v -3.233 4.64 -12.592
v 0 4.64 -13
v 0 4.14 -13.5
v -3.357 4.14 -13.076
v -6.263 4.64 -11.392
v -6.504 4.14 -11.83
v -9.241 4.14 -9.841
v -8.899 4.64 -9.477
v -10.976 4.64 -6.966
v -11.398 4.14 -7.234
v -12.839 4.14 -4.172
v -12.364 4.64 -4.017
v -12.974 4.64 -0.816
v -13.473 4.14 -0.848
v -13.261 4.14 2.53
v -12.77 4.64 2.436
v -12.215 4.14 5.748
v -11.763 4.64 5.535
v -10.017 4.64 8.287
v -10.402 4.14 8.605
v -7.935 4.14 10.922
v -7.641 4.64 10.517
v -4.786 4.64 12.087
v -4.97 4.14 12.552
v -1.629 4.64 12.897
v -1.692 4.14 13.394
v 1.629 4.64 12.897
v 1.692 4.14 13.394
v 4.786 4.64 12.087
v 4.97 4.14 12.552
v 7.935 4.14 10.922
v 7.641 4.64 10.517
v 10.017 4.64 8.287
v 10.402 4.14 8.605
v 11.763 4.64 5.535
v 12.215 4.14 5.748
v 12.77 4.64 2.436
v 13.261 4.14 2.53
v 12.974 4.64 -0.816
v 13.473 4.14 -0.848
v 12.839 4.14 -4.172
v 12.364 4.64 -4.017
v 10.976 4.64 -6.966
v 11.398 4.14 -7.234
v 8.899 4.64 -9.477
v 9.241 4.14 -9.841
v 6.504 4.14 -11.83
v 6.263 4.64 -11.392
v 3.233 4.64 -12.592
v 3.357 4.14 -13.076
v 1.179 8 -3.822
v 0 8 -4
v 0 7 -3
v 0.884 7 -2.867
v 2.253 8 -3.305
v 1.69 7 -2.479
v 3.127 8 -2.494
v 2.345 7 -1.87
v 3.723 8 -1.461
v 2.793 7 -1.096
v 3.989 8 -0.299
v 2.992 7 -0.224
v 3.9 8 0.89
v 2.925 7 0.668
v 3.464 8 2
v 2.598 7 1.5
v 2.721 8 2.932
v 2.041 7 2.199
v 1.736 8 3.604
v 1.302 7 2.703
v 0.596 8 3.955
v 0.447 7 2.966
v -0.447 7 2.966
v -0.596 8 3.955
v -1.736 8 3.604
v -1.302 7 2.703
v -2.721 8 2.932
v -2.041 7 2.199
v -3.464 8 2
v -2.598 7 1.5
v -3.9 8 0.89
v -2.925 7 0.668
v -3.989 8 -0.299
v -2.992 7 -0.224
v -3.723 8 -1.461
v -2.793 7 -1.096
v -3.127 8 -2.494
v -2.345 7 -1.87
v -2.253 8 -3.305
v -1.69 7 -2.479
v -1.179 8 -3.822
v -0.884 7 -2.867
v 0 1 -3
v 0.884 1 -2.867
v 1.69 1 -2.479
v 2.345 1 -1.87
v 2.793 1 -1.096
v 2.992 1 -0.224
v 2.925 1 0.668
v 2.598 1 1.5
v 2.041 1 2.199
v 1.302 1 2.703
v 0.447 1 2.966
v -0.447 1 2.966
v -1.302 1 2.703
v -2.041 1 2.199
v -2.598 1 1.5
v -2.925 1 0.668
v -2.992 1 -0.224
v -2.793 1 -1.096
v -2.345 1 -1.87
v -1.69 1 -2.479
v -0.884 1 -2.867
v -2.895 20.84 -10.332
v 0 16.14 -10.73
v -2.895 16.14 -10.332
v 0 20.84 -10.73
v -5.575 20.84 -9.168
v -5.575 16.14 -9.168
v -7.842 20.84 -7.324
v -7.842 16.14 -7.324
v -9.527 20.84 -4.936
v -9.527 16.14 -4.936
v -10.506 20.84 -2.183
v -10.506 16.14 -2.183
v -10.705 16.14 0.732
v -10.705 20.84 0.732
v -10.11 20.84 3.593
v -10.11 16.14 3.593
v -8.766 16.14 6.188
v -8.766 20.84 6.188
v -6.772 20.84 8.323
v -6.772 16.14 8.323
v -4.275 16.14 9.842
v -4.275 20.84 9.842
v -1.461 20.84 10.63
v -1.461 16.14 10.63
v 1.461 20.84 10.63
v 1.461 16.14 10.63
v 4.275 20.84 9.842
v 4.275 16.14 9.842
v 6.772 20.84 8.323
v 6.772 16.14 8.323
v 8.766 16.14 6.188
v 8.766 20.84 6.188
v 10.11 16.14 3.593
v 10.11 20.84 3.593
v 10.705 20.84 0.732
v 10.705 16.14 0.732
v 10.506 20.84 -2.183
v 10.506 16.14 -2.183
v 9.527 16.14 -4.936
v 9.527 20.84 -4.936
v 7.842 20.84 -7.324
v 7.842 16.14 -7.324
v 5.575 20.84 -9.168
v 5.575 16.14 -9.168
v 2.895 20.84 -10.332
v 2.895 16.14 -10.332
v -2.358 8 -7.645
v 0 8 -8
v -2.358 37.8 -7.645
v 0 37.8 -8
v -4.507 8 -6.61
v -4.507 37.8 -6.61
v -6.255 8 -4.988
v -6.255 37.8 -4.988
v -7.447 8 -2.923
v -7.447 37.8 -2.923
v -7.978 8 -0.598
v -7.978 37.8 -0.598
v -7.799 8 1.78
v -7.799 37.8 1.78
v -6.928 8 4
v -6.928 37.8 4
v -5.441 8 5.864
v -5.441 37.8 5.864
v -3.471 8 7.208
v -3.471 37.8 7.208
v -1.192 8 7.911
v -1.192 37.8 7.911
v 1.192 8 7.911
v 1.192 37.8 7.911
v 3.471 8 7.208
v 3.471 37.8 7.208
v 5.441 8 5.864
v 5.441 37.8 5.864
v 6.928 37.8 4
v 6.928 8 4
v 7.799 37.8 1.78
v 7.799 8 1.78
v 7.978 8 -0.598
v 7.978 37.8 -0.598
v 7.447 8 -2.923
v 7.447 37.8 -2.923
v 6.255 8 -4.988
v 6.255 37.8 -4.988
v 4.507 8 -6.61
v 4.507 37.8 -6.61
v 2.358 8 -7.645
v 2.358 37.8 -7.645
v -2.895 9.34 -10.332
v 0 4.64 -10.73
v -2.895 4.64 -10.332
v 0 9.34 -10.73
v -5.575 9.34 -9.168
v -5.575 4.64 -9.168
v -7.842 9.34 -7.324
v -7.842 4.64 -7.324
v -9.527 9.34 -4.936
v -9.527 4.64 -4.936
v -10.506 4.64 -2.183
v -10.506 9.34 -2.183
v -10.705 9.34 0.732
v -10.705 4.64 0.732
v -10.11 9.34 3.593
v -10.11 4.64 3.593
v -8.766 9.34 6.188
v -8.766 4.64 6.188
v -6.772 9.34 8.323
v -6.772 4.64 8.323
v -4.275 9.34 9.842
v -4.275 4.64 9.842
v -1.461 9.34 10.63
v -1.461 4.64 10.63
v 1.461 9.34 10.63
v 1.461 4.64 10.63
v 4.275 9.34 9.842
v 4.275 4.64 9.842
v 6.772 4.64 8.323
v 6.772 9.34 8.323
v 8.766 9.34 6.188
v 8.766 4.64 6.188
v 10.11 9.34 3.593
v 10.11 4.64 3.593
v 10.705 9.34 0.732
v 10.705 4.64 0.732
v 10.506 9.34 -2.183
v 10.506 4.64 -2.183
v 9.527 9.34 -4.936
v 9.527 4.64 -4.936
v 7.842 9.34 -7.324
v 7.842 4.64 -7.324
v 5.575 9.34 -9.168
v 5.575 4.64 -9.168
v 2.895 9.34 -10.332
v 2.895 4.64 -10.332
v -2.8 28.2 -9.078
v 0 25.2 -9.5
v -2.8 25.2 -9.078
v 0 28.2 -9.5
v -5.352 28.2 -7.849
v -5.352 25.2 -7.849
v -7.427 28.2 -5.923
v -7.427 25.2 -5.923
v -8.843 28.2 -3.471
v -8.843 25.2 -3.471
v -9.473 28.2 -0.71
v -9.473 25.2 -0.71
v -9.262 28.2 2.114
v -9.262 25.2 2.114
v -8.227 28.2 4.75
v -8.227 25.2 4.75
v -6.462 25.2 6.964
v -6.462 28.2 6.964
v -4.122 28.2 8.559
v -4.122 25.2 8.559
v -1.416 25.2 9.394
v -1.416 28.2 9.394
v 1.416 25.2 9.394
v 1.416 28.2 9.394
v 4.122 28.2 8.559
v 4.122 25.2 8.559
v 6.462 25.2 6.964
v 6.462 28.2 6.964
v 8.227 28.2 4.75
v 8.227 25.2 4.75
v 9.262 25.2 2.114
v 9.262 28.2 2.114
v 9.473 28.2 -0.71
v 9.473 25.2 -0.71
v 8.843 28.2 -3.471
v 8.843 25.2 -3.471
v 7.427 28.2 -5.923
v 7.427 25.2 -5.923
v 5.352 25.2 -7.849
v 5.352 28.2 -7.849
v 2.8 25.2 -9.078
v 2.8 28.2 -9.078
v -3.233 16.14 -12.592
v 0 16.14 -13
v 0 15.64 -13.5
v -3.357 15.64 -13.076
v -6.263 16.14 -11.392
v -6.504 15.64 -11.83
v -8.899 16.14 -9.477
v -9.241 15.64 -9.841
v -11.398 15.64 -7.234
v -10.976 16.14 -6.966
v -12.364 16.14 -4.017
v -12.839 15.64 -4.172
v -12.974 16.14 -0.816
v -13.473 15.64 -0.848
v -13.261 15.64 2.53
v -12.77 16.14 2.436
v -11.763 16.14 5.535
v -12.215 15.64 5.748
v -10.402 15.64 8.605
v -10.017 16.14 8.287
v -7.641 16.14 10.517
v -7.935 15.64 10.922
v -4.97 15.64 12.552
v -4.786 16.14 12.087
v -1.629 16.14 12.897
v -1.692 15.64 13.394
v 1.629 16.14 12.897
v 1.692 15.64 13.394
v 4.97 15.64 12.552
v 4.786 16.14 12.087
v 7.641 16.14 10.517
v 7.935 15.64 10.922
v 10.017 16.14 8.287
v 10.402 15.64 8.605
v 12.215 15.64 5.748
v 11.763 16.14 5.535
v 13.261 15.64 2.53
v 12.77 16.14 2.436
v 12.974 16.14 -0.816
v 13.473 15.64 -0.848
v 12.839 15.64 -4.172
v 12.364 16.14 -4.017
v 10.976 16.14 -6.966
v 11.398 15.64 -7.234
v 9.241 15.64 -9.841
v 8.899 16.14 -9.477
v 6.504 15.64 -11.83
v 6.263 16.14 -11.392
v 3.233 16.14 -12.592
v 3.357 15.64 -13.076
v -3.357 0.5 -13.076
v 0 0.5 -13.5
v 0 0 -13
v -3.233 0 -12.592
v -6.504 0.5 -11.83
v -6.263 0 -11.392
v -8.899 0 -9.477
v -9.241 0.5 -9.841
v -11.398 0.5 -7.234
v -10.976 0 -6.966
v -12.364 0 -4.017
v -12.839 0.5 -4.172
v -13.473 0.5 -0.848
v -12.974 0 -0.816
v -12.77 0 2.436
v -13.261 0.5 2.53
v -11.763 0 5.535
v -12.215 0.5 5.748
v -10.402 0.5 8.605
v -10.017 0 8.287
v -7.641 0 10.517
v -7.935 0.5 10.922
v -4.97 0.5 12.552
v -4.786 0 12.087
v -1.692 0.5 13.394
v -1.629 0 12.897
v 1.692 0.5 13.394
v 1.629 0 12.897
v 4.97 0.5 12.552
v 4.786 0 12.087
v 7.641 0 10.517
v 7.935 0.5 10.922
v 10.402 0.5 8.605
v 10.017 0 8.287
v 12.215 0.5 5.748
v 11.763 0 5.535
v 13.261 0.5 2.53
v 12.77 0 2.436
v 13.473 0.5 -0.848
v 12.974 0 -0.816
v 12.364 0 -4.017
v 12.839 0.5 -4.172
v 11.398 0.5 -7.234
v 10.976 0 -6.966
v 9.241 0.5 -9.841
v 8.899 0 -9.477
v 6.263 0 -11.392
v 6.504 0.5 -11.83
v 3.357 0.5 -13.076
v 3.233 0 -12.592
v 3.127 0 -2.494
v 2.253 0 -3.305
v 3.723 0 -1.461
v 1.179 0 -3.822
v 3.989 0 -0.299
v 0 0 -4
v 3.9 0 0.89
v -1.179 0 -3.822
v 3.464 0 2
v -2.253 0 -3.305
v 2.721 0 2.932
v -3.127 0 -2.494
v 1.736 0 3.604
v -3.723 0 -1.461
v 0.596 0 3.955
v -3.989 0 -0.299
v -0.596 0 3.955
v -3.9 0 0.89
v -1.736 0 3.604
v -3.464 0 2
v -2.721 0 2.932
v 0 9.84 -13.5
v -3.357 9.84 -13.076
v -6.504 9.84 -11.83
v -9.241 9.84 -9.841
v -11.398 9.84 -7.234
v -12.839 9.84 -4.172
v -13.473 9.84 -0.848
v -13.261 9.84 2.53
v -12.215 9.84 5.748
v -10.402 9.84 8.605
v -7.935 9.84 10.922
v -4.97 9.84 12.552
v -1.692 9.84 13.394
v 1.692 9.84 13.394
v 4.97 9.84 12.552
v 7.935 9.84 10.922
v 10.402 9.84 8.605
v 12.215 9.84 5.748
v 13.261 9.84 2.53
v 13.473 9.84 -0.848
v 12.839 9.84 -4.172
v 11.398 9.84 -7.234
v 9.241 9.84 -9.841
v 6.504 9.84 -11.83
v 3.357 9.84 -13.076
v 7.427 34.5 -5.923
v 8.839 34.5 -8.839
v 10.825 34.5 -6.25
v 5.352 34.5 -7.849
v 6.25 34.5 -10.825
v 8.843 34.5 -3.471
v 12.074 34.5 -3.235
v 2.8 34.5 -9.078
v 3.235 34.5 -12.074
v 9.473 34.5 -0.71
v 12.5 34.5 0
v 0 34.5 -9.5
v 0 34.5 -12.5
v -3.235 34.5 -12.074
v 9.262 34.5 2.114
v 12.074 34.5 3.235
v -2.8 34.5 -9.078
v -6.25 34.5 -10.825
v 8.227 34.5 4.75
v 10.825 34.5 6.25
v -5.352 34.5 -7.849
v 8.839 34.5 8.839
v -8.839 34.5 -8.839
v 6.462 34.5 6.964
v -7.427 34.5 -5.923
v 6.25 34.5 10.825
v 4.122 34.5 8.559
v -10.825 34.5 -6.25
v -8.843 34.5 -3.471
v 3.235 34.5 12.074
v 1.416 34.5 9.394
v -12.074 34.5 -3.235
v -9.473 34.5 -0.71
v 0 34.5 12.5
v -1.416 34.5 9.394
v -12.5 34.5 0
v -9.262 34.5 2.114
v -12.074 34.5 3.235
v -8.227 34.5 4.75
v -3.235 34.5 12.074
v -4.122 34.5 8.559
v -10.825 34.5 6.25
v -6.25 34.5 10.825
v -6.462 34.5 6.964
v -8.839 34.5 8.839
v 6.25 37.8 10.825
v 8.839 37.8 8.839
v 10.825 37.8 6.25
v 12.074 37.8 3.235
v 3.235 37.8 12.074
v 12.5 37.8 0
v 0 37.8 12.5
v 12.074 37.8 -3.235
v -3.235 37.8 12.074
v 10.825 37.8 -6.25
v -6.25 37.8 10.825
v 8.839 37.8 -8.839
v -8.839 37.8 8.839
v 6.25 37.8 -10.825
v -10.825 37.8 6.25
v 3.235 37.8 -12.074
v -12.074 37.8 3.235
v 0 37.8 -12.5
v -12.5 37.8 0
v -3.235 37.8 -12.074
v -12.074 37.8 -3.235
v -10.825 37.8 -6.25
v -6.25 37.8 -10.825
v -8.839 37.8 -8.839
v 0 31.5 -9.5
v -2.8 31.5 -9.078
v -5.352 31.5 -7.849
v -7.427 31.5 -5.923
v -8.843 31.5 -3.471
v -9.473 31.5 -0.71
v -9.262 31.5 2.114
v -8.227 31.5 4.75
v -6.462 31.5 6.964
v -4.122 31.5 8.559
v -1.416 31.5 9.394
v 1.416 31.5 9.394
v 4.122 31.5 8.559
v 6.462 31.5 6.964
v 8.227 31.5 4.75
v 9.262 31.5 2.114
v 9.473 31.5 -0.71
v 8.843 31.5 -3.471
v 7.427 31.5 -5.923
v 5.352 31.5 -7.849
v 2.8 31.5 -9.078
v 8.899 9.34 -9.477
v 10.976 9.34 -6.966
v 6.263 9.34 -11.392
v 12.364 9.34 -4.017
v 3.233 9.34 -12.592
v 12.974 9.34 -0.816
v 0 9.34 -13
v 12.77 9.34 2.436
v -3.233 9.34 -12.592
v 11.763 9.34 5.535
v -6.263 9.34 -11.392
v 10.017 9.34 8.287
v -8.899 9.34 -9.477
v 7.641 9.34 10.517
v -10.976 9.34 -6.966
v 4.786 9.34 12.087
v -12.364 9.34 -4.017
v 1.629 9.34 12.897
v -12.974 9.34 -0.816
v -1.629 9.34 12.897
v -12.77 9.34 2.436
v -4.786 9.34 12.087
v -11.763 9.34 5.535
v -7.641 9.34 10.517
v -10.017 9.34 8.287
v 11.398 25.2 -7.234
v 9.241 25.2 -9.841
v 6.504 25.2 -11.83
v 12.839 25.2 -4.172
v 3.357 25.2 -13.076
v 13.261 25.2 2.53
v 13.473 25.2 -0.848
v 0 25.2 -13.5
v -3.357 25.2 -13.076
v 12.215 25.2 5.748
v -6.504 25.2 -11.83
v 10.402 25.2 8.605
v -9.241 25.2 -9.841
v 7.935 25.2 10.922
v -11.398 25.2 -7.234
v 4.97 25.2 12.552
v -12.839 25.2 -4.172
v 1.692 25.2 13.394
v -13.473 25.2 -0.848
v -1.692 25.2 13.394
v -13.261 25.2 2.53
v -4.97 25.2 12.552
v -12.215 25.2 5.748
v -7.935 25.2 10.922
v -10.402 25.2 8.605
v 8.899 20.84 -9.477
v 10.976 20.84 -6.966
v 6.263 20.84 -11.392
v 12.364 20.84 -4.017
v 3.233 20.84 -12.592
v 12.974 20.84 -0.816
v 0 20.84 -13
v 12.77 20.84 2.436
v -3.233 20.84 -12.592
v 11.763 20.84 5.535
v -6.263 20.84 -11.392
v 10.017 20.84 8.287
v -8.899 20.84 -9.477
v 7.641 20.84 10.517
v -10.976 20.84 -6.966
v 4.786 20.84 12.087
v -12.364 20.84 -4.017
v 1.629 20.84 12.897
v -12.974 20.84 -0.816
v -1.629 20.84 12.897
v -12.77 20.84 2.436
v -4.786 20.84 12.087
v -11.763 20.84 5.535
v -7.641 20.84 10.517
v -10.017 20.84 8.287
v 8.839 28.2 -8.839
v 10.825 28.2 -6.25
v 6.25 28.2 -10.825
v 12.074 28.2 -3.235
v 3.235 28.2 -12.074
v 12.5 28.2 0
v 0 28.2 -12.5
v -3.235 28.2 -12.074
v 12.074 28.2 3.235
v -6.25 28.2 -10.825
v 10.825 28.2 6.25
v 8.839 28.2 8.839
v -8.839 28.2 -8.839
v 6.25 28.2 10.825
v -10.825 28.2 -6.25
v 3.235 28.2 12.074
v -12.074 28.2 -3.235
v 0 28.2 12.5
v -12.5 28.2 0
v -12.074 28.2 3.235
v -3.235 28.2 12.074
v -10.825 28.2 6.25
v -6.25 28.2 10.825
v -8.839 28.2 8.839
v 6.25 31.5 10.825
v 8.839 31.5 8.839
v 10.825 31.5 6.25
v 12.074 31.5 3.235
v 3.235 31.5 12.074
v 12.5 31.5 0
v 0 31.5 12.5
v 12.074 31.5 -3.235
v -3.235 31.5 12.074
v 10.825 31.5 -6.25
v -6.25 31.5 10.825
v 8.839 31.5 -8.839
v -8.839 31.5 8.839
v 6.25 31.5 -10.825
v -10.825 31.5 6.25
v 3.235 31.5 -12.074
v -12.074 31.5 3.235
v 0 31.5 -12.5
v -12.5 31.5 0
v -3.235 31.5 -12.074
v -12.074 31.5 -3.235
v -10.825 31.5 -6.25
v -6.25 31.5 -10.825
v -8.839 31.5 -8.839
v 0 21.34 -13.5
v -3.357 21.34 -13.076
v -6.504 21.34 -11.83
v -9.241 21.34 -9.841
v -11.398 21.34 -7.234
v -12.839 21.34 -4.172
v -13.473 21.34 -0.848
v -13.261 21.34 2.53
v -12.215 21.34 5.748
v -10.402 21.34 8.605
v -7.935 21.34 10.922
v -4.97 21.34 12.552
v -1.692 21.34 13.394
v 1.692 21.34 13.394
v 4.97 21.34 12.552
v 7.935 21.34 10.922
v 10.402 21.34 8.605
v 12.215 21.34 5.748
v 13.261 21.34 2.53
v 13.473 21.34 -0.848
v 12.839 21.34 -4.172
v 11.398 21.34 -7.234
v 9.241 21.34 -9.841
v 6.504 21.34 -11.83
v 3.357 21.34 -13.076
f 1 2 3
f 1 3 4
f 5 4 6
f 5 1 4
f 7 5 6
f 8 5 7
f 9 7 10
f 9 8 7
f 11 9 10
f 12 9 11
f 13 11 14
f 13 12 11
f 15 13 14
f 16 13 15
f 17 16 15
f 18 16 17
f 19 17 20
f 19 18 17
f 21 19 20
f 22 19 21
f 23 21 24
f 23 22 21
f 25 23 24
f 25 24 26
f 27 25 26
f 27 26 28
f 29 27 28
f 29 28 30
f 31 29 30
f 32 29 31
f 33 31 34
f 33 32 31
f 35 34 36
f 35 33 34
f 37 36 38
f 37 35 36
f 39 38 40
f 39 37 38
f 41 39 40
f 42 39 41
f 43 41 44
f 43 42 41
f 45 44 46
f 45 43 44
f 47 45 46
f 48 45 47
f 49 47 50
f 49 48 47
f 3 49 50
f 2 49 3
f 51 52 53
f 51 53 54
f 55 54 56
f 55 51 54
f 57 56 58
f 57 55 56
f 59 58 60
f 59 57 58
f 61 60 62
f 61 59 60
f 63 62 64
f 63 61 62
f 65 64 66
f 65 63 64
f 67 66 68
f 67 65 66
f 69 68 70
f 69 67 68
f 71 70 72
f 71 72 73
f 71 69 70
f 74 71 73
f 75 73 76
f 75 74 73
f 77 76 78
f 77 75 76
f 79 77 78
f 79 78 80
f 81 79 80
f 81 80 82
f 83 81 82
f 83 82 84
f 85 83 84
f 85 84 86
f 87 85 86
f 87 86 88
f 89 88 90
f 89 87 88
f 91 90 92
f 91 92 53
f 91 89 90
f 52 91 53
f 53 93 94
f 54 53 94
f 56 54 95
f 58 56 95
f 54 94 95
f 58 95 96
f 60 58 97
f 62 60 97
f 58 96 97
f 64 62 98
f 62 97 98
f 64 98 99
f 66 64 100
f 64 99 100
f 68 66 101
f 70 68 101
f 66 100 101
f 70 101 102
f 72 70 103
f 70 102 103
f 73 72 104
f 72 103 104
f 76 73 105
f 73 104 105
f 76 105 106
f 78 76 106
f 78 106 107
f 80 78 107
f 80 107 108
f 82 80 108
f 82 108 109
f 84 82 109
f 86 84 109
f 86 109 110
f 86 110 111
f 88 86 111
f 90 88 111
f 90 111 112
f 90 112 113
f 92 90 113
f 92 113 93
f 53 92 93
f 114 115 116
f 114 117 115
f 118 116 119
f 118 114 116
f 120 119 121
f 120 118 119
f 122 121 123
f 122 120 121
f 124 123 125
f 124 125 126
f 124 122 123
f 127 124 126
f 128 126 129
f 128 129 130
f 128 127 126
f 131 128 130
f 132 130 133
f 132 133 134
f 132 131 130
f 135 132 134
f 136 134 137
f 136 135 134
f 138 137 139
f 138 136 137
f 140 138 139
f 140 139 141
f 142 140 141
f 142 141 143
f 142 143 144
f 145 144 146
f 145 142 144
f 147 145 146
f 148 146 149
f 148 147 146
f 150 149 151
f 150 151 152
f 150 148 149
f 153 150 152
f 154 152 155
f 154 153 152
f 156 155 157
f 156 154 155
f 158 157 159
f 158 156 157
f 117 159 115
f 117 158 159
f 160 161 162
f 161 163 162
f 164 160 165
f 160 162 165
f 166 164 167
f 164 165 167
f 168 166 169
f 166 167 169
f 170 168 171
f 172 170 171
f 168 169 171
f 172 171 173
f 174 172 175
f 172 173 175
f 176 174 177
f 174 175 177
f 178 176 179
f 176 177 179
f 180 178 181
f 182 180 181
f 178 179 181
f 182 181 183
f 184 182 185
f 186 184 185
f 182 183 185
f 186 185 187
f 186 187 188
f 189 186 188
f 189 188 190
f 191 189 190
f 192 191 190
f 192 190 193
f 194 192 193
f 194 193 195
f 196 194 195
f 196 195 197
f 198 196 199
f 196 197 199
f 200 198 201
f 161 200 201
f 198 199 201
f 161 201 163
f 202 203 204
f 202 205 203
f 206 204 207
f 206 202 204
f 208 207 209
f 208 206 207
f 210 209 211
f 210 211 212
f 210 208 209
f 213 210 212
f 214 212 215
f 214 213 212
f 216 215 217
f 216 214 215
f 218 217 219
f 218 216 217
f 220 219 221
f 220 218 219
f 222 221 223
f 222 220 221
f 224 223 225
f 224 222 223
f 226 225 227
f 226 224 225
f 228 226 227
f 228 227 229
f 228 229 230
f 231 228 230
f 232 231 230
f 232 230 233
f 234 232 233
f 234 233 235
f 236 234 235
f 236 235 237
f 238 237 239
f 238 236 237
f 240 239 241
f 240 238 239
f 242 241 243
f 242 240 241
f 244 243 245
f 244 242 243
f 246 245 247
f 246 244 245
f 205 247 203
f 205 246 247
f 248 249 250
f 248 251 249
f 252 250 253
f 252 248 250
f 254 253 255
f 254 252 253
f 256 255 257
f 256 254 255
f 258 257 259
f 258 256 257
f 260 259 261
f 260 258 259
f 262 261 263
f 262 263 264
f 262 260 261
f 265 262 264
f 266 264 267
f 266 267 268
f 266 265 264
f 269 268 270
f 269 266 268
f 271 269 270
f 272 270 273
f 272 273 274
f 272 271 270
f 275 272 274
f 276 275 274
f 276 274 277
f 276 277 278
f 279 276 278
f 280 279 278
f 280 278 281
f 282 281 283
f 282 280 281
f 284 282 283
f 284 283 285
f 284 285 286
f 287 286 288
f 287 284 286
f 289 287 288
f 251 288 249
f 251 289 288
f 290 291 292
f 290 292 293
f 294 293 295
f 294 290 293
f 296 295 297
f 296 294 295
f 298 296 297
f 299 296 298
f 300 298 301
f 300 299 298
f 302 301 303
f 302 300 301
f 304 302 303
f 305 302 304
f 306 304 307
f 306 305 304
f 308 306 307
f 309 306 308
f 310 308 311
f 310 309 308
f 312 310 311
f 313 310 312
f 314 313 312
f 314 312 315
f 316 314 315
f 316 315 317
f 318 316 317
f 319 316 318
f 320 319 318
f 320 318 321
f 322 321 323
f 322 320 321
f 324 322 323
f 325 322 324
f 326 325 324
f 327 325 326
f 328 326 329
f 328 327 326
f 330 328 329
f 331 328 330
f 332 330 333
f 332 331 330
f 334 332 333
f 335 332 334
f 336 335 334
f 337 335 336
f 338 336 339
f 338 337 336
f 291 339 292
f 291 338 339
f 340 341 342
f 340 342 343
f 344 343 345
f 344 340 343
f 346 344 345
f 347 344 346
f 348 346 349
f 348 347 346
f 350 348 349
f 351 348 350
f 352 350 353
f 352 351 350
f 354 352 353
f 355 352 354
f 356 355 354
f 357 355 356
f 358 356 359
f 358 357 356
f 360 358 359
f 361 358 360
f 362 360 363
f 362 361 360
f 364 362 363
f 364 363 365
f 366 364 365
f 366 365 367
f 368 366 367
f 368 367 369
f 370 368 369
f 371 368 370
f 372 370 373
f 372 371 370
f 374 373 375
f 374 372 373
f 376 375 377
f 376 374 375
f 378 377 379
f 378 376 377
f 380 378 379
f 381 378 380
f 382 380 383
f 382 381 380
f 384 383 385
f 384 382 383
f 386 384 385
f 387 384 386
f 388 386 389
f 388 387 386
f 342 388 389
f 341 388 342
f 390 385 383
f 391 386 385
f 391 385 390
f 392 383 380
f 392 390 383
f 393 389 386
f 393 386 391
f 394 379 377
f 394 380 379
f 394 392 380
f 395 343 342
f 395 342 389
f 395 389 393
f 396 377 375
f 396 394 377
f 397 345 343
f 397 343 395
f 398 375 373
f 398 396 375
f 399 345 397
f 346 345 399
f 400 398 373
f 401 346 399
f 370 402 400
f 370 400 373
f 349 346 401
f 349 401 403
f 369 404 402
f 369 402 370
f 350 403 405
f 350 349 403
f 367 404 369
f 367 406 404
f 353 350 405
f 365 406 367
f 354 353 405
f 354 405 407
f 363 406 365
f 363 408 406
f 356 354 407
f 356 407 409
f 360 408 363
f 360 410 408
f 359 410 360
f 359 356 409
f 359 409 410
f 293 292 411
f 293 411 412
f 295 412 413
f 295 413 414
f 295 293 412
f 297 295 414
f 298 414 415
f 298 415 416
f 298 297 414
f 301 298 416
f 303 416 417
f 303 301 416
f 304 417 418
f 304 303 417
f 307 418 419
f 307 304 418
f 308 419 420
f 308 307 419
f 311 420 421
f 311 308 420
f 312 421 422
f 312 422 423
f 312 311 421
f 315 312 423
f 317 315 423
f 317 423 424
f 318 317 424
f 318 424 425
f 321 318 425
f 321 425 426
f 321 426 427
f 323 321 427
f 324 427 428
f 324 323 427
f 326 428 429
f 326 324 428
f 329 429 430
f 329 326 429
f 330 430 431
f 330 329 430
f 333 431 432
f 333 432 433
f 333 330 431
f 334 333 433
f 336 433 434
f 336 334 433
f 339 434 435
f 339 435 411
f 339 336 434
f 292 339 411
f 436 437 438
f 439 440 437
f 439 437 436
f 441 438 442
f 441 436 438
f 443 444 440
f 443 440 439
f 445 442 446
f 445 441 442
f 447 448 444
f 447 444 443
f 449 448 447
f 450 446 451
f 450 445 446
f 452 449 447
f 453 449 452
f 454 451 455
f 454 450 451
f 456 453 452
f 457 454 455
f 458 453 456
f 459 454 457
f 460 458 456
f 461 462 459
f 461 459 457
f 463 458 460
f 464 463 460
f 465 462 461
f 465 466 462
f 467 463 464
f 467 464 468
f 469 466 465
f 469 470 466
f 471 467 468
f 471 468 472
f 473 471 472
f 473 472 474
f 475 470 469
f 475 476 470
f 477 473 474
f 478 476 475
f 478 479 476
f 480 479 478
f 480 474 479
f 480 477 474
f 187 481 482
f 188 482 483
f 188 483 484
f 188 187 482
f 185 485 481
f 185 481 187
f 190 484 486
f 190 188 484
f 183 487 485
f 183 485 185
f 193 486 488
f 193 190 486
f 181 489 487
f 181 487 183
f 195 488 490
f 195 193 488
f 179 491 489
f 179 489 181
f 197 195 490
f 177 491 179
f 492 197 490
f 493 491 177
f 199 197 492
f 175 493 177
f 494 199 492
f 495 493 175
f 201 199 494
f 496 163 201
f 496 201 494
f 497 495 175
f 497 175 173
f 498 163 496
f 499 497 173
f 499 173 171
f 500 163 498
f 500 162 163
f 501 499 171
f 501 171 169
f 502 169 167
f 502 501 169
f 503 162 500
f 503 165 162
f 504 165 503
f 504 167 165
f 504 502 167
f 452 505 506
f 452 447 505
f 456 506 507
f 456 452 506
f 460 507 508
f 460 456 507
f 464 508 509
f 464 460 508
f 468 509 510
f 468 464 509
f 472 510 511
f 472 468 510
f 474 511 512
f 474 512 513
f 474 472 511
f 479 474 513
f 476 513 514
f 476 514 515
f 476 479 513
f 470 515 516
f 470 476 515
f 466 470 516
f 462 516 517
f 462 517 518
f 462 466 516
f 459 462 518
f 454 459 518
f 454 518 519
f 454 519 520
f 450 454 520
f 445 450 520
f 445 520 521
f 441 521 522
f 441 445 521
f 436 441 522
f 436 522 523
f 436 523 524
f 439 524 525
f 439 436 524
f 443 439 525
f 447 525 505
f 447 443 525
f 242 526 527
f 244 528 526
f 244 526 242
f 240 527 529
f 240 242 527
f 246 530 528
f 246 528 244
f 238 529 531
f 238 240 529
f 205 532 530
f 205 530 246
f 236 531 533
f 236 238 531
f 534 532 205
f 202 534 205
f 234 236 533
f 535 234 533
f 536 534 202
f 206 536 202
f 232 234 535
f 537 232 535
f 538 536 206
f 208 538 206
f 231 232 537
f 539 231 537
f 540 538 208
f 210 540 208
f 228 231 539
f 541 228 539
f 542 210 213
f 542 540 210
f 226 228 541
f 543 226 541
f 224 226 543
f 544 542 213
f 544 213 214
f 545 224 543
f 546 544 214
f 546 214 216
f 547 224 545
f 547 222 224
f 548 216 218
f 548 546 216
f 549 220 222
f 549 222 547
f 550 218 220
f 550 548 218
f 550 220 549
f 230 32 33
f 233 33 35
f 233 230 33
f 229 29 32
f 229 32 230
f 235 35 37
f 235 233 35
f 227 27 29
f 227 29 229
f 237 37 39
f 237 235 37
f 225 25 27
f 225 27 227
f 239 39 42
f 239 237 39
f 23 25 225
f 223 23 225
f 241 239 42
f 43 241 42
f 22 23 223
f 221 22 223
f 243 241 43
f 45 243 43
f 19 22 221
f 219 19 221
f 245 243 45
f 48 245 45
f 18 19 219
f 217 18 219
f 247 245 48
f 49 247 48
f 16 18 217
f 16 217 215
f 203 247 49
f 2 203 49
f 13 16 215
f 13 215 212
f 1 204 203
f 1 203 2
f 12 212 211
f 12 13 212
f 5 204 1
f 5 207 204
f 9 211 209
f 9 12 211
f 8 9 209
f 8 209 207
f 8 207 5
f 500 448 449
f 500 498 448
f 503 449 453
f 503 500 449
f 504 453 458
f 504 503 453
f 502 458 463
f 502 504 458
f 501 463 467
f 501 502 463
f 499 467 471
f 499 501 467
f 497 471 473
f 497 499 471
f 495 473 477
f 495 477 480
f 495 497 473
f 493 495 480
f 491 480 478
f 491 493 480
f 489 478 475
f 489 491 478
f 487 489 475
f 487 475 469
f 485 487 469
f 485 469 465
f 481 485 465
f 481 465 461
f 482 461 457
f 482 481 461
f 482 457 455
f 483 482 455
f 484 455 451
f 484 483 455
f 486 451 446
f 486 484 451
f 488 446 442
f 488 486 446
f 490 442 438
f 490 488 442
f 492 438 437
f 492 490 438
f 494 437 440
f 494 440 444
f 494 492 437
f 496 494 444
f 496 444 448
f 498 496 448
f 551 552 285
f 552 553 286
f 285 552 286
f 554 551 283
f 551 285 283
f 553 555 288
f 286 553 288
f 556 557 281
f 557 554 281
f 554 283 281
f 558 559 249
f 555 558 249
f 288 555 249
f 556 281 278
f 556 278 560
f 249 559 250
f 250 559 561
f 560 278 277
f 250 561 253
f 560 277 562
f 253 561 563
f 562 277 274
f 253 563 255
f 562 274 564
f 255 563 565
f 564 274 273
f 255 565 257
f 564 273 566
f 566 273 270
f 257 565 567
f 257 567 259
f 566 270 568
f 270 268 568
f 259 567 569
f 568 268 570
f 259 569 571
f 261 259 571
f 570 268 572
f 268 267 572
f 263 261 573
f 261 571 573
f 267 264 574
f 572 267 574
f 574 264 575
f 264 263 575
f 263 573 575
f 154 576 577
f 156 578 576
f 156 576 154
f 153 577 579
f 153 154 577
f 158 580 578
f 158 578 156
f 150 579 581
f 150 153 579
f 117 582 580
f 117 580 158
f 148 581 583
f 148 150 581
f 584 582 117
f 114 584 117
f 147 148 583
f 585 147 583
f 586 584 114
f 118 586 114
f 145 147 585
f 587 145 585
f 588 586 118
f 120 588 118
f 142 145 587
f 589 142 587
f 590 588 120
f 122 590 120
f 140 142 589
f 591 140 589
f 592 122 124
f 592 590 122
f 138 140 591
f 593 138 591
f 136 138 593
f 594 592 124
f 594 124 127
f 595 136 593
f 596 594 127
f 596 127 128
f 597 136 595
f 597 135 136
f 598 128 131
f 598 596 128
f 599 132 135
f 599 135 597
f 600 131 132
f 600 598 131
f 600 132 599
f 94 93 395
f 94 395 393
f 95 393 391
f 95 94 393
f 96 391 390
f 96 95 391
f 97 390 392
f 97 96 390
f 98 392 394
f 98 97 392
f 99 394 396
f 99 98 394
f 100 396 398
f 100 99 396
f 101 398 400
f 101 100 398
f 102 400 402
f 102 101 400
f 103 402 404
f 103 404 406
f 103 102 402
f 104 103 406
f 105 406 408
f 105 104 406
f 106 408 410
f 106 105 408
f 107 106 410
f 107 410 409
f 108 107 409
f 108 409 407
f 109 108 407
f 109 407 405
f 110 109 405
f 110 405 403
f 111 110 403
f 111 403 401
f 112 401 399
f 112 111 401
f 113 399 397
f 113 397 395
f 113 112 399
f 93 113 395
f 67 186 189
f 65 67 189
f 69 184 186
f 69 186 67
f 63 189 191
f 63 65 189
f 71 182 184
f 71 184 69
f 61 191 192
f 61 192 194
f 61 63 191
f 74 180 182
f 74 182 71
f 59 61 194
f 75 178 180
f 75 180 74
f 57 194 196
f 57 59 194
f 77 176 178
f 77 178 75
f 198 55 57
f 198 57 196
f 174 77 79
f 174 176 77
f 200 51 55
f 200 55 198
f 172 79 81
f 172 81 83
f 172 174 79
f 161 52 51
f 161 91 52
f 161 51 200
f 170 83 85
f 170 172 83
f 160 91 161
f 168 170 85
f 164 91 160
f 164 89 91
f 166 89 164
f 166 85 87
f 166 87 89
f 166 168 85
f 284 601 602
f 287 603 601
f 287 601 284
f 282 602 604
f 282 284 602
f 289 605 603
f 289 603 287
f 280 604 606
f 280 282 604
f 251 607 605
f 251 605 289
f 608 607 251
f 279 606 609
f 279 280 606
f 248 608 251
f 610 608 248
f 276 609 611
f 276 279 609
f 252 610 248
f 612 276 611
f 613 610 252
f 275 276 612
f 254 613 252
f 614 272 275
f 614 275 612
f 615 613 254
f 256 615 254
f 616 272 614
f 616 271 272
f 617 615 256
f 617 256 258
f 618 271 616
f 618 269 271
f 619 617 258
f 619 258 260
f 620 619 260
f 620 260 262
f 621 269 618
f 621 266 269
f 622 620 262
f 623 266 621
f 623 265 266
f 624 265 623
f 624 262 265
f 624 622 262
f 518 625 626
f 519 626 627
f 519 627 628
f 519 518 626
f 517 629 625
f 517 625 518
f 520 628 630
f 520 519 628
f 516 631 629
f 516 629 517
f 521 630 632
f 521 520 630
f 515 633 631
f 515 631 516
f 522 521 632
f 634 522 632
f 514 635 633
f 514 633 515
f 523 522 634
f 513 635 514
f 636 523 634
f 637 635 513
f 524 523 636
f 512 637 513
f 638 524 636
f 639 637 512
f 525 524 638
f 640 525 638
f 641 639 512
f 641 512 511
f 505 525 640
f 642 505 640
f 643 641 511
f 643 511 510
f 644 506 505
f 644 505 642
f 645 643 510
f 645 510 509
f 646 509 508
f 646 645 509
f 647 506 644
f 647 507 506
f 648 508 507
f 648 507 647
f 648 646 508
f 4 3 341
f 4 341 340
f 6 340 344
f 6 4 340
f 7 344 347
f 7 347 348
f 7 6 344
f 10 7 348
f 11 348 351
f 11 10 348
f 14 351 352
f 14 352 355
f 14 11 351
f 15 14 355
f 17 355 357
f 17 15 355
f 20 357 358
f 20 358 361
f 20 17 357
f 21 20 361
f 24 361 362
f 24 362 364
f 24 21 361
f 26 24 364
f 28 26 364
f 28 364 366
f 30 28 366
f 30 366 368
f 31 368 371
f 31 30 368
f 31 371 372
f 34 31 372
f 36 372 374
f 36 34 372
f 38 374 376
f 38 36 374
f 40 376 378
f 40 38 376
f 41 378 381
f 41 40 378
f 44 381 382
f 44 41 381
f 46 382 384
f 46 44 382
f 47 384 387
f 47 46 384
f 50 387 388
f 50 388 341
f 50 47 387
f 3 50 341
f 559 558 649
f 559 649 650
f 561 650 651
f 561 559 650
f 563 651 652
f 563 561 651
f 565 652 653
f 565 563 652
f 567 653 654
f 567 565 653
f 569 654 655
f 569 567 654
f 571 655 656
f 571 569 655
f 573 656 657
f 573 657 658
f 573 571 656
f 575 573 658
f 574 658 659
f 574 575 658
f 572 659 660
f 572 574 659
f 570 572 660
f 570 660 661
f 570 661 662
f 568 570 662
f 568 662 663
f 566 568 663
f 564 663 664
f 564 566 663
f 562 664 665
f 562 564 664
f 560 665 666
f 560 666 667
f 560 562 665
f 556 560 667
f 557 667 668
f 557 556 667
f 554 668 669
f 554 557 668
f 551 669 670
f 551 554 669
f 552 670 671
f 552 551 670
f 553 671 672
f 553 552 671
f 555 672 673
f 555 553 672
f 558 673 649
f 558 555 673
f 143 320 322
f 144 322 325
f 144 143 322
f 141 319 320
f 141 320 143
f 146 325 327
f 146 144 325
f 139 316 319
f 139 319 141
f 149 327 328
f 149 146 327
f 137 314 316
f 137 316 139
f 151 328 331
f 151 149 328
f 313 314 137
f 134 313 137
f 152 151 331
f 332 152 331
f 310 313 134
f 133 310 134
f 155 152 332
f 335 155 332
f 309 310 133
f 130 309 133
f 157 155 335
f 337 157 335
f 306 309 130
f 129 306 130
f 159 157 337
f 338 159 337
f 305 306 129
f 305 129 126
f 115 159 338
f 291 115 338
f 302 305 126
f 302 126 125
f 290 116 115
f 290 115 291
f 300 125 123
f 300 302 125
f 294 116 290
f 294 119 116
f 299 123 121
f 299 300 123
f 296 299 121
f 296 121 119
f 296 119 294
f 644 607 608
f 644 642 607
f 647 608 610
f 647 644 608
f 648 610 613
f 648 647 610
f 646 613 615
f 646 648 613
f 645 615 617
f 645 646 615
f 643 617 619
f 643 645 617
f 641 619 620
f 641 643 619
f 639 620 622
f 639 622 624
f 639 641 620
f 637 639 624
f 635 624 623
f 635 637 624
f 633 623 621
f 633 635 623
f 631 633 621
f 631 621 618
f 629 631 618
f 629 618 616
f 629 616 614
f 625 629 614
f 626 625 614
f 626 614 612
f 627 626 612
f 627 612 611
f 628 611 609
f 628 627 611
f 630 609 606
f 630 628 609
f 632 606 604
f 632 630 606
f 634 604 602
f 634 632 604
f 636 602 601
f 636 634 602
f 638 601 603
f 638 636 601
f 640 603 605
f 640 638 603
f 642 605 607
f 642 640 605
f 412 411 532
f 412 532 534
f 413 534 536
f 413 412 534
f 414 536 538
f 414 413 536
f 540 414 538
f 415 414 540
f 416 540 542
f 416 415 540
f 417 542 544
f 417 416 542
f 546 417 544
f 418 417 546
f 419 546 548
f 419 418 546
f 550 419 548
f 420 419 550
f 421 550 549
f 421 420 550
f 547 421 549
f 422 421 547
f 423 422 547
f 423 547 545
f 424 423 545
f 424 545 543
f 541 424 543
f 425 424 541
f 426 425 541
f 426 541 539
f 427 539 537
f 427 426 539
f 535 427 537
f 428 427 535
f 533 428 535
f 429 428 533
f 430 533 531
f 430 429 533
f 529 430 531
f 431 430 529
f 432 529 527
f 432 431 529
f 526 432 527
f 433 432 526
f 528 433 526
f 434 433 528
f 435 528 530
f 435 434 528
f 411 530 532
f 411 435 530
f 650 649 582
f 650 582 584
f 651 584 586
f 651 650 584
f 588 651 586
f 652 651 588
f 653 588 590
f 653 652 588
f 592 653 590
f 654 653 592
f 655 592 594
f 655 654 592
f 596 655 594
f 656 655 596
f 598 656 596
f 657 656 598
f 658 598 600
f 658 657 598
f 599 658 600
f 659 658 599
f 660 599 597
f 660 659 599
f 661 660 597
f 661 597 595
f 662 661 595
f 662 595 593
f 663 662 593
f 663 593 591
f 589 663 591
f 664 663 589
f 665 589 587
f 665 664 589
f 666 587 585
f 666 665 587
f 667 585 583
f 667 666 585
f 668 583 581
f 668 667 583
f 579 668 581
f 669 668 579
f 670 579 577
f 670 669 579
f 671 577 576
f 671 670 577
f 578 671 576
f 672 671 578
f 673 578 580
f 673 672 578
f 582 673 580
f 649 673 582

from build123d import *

# Parameters (mm, degrees)
ESQUISSE4_R             = 3
ENL_V_MAT_EXTRU_3_DEPTH = 43.347845282
CHANFREIN4_SIZE         = 1
CHANFREIN3_SIZE         = 0.5


with BuildPart() as part:
    # Esquisse1 → Révolution1 (revolve)
    with BuildSketch(Plane.XY, mode=Mode.PRIVATE) as r_volution1_sk:
        Polygon((0, 0), (-13.5, 0), (-13.5, 4.64), (-10.73, 4.64), (-10.73, 9.34), (-13.5, 9.34), (-13.5, 16.14), (-10.73, 16.14), (-10.73, 20.84), (-13.5, 20.84), (-13.5, 25.2), (-12.5, 25.2), (-9.5, 25.2), (-9.5, 28.2), (-12.5, 28.2), (-12.5, 31.5), (-9.5, 31.5), (-9.5, 34.5), (-12.5, 34.5), (-12.5, 37.8), (-8, 37.8), (-8, 20.84), (-8, 8), (0, 8), align=None)
    revolve(r_volution1_sk.sketch.rotate(Axis((0, -29.115408637, 0), (0, 1, 0)), 270), axis=Axis((0, -29.115408637, 0), (0, 1, 0)))

    # Esquisse4 → Enlèv. mat.-Extru.3 (cut, through all)
    with BuildSketch(Plane.XZ):
        with Locations(Location((0, 0, 0), (0, 0, 270))):
            Circle(ESQUISSE4_R)
    extrude(amount=-ENL_V_MAT_EXTRU_3_DEPTH, mode=Mode.SUBTRACT)

    # Chanfrein4
    chanfrein4_edges = [part.edges().sort_by_distance(p)[0] for p in [
        (0, 8, 3),
        (0, 0, 3),
    ]]
    chamfer(chanfrein4_edges, length=CHANFREIN4_SIZE)

    # Chanfrein3
    chanfrein3_edges = [part.edges().sort_by_distance(p)[0] for p in [
        (0, 0, 13.5),
        (0, 4.64, 13.5),
        (0, 9.34, 13.5),
        (0, 16.14, 13.5),
        (0, 20.84, 13.5),
    ]]
    chamfer(chanfrein3_edges, length=CHANFREIN3_SIZE)


solid = part.part
